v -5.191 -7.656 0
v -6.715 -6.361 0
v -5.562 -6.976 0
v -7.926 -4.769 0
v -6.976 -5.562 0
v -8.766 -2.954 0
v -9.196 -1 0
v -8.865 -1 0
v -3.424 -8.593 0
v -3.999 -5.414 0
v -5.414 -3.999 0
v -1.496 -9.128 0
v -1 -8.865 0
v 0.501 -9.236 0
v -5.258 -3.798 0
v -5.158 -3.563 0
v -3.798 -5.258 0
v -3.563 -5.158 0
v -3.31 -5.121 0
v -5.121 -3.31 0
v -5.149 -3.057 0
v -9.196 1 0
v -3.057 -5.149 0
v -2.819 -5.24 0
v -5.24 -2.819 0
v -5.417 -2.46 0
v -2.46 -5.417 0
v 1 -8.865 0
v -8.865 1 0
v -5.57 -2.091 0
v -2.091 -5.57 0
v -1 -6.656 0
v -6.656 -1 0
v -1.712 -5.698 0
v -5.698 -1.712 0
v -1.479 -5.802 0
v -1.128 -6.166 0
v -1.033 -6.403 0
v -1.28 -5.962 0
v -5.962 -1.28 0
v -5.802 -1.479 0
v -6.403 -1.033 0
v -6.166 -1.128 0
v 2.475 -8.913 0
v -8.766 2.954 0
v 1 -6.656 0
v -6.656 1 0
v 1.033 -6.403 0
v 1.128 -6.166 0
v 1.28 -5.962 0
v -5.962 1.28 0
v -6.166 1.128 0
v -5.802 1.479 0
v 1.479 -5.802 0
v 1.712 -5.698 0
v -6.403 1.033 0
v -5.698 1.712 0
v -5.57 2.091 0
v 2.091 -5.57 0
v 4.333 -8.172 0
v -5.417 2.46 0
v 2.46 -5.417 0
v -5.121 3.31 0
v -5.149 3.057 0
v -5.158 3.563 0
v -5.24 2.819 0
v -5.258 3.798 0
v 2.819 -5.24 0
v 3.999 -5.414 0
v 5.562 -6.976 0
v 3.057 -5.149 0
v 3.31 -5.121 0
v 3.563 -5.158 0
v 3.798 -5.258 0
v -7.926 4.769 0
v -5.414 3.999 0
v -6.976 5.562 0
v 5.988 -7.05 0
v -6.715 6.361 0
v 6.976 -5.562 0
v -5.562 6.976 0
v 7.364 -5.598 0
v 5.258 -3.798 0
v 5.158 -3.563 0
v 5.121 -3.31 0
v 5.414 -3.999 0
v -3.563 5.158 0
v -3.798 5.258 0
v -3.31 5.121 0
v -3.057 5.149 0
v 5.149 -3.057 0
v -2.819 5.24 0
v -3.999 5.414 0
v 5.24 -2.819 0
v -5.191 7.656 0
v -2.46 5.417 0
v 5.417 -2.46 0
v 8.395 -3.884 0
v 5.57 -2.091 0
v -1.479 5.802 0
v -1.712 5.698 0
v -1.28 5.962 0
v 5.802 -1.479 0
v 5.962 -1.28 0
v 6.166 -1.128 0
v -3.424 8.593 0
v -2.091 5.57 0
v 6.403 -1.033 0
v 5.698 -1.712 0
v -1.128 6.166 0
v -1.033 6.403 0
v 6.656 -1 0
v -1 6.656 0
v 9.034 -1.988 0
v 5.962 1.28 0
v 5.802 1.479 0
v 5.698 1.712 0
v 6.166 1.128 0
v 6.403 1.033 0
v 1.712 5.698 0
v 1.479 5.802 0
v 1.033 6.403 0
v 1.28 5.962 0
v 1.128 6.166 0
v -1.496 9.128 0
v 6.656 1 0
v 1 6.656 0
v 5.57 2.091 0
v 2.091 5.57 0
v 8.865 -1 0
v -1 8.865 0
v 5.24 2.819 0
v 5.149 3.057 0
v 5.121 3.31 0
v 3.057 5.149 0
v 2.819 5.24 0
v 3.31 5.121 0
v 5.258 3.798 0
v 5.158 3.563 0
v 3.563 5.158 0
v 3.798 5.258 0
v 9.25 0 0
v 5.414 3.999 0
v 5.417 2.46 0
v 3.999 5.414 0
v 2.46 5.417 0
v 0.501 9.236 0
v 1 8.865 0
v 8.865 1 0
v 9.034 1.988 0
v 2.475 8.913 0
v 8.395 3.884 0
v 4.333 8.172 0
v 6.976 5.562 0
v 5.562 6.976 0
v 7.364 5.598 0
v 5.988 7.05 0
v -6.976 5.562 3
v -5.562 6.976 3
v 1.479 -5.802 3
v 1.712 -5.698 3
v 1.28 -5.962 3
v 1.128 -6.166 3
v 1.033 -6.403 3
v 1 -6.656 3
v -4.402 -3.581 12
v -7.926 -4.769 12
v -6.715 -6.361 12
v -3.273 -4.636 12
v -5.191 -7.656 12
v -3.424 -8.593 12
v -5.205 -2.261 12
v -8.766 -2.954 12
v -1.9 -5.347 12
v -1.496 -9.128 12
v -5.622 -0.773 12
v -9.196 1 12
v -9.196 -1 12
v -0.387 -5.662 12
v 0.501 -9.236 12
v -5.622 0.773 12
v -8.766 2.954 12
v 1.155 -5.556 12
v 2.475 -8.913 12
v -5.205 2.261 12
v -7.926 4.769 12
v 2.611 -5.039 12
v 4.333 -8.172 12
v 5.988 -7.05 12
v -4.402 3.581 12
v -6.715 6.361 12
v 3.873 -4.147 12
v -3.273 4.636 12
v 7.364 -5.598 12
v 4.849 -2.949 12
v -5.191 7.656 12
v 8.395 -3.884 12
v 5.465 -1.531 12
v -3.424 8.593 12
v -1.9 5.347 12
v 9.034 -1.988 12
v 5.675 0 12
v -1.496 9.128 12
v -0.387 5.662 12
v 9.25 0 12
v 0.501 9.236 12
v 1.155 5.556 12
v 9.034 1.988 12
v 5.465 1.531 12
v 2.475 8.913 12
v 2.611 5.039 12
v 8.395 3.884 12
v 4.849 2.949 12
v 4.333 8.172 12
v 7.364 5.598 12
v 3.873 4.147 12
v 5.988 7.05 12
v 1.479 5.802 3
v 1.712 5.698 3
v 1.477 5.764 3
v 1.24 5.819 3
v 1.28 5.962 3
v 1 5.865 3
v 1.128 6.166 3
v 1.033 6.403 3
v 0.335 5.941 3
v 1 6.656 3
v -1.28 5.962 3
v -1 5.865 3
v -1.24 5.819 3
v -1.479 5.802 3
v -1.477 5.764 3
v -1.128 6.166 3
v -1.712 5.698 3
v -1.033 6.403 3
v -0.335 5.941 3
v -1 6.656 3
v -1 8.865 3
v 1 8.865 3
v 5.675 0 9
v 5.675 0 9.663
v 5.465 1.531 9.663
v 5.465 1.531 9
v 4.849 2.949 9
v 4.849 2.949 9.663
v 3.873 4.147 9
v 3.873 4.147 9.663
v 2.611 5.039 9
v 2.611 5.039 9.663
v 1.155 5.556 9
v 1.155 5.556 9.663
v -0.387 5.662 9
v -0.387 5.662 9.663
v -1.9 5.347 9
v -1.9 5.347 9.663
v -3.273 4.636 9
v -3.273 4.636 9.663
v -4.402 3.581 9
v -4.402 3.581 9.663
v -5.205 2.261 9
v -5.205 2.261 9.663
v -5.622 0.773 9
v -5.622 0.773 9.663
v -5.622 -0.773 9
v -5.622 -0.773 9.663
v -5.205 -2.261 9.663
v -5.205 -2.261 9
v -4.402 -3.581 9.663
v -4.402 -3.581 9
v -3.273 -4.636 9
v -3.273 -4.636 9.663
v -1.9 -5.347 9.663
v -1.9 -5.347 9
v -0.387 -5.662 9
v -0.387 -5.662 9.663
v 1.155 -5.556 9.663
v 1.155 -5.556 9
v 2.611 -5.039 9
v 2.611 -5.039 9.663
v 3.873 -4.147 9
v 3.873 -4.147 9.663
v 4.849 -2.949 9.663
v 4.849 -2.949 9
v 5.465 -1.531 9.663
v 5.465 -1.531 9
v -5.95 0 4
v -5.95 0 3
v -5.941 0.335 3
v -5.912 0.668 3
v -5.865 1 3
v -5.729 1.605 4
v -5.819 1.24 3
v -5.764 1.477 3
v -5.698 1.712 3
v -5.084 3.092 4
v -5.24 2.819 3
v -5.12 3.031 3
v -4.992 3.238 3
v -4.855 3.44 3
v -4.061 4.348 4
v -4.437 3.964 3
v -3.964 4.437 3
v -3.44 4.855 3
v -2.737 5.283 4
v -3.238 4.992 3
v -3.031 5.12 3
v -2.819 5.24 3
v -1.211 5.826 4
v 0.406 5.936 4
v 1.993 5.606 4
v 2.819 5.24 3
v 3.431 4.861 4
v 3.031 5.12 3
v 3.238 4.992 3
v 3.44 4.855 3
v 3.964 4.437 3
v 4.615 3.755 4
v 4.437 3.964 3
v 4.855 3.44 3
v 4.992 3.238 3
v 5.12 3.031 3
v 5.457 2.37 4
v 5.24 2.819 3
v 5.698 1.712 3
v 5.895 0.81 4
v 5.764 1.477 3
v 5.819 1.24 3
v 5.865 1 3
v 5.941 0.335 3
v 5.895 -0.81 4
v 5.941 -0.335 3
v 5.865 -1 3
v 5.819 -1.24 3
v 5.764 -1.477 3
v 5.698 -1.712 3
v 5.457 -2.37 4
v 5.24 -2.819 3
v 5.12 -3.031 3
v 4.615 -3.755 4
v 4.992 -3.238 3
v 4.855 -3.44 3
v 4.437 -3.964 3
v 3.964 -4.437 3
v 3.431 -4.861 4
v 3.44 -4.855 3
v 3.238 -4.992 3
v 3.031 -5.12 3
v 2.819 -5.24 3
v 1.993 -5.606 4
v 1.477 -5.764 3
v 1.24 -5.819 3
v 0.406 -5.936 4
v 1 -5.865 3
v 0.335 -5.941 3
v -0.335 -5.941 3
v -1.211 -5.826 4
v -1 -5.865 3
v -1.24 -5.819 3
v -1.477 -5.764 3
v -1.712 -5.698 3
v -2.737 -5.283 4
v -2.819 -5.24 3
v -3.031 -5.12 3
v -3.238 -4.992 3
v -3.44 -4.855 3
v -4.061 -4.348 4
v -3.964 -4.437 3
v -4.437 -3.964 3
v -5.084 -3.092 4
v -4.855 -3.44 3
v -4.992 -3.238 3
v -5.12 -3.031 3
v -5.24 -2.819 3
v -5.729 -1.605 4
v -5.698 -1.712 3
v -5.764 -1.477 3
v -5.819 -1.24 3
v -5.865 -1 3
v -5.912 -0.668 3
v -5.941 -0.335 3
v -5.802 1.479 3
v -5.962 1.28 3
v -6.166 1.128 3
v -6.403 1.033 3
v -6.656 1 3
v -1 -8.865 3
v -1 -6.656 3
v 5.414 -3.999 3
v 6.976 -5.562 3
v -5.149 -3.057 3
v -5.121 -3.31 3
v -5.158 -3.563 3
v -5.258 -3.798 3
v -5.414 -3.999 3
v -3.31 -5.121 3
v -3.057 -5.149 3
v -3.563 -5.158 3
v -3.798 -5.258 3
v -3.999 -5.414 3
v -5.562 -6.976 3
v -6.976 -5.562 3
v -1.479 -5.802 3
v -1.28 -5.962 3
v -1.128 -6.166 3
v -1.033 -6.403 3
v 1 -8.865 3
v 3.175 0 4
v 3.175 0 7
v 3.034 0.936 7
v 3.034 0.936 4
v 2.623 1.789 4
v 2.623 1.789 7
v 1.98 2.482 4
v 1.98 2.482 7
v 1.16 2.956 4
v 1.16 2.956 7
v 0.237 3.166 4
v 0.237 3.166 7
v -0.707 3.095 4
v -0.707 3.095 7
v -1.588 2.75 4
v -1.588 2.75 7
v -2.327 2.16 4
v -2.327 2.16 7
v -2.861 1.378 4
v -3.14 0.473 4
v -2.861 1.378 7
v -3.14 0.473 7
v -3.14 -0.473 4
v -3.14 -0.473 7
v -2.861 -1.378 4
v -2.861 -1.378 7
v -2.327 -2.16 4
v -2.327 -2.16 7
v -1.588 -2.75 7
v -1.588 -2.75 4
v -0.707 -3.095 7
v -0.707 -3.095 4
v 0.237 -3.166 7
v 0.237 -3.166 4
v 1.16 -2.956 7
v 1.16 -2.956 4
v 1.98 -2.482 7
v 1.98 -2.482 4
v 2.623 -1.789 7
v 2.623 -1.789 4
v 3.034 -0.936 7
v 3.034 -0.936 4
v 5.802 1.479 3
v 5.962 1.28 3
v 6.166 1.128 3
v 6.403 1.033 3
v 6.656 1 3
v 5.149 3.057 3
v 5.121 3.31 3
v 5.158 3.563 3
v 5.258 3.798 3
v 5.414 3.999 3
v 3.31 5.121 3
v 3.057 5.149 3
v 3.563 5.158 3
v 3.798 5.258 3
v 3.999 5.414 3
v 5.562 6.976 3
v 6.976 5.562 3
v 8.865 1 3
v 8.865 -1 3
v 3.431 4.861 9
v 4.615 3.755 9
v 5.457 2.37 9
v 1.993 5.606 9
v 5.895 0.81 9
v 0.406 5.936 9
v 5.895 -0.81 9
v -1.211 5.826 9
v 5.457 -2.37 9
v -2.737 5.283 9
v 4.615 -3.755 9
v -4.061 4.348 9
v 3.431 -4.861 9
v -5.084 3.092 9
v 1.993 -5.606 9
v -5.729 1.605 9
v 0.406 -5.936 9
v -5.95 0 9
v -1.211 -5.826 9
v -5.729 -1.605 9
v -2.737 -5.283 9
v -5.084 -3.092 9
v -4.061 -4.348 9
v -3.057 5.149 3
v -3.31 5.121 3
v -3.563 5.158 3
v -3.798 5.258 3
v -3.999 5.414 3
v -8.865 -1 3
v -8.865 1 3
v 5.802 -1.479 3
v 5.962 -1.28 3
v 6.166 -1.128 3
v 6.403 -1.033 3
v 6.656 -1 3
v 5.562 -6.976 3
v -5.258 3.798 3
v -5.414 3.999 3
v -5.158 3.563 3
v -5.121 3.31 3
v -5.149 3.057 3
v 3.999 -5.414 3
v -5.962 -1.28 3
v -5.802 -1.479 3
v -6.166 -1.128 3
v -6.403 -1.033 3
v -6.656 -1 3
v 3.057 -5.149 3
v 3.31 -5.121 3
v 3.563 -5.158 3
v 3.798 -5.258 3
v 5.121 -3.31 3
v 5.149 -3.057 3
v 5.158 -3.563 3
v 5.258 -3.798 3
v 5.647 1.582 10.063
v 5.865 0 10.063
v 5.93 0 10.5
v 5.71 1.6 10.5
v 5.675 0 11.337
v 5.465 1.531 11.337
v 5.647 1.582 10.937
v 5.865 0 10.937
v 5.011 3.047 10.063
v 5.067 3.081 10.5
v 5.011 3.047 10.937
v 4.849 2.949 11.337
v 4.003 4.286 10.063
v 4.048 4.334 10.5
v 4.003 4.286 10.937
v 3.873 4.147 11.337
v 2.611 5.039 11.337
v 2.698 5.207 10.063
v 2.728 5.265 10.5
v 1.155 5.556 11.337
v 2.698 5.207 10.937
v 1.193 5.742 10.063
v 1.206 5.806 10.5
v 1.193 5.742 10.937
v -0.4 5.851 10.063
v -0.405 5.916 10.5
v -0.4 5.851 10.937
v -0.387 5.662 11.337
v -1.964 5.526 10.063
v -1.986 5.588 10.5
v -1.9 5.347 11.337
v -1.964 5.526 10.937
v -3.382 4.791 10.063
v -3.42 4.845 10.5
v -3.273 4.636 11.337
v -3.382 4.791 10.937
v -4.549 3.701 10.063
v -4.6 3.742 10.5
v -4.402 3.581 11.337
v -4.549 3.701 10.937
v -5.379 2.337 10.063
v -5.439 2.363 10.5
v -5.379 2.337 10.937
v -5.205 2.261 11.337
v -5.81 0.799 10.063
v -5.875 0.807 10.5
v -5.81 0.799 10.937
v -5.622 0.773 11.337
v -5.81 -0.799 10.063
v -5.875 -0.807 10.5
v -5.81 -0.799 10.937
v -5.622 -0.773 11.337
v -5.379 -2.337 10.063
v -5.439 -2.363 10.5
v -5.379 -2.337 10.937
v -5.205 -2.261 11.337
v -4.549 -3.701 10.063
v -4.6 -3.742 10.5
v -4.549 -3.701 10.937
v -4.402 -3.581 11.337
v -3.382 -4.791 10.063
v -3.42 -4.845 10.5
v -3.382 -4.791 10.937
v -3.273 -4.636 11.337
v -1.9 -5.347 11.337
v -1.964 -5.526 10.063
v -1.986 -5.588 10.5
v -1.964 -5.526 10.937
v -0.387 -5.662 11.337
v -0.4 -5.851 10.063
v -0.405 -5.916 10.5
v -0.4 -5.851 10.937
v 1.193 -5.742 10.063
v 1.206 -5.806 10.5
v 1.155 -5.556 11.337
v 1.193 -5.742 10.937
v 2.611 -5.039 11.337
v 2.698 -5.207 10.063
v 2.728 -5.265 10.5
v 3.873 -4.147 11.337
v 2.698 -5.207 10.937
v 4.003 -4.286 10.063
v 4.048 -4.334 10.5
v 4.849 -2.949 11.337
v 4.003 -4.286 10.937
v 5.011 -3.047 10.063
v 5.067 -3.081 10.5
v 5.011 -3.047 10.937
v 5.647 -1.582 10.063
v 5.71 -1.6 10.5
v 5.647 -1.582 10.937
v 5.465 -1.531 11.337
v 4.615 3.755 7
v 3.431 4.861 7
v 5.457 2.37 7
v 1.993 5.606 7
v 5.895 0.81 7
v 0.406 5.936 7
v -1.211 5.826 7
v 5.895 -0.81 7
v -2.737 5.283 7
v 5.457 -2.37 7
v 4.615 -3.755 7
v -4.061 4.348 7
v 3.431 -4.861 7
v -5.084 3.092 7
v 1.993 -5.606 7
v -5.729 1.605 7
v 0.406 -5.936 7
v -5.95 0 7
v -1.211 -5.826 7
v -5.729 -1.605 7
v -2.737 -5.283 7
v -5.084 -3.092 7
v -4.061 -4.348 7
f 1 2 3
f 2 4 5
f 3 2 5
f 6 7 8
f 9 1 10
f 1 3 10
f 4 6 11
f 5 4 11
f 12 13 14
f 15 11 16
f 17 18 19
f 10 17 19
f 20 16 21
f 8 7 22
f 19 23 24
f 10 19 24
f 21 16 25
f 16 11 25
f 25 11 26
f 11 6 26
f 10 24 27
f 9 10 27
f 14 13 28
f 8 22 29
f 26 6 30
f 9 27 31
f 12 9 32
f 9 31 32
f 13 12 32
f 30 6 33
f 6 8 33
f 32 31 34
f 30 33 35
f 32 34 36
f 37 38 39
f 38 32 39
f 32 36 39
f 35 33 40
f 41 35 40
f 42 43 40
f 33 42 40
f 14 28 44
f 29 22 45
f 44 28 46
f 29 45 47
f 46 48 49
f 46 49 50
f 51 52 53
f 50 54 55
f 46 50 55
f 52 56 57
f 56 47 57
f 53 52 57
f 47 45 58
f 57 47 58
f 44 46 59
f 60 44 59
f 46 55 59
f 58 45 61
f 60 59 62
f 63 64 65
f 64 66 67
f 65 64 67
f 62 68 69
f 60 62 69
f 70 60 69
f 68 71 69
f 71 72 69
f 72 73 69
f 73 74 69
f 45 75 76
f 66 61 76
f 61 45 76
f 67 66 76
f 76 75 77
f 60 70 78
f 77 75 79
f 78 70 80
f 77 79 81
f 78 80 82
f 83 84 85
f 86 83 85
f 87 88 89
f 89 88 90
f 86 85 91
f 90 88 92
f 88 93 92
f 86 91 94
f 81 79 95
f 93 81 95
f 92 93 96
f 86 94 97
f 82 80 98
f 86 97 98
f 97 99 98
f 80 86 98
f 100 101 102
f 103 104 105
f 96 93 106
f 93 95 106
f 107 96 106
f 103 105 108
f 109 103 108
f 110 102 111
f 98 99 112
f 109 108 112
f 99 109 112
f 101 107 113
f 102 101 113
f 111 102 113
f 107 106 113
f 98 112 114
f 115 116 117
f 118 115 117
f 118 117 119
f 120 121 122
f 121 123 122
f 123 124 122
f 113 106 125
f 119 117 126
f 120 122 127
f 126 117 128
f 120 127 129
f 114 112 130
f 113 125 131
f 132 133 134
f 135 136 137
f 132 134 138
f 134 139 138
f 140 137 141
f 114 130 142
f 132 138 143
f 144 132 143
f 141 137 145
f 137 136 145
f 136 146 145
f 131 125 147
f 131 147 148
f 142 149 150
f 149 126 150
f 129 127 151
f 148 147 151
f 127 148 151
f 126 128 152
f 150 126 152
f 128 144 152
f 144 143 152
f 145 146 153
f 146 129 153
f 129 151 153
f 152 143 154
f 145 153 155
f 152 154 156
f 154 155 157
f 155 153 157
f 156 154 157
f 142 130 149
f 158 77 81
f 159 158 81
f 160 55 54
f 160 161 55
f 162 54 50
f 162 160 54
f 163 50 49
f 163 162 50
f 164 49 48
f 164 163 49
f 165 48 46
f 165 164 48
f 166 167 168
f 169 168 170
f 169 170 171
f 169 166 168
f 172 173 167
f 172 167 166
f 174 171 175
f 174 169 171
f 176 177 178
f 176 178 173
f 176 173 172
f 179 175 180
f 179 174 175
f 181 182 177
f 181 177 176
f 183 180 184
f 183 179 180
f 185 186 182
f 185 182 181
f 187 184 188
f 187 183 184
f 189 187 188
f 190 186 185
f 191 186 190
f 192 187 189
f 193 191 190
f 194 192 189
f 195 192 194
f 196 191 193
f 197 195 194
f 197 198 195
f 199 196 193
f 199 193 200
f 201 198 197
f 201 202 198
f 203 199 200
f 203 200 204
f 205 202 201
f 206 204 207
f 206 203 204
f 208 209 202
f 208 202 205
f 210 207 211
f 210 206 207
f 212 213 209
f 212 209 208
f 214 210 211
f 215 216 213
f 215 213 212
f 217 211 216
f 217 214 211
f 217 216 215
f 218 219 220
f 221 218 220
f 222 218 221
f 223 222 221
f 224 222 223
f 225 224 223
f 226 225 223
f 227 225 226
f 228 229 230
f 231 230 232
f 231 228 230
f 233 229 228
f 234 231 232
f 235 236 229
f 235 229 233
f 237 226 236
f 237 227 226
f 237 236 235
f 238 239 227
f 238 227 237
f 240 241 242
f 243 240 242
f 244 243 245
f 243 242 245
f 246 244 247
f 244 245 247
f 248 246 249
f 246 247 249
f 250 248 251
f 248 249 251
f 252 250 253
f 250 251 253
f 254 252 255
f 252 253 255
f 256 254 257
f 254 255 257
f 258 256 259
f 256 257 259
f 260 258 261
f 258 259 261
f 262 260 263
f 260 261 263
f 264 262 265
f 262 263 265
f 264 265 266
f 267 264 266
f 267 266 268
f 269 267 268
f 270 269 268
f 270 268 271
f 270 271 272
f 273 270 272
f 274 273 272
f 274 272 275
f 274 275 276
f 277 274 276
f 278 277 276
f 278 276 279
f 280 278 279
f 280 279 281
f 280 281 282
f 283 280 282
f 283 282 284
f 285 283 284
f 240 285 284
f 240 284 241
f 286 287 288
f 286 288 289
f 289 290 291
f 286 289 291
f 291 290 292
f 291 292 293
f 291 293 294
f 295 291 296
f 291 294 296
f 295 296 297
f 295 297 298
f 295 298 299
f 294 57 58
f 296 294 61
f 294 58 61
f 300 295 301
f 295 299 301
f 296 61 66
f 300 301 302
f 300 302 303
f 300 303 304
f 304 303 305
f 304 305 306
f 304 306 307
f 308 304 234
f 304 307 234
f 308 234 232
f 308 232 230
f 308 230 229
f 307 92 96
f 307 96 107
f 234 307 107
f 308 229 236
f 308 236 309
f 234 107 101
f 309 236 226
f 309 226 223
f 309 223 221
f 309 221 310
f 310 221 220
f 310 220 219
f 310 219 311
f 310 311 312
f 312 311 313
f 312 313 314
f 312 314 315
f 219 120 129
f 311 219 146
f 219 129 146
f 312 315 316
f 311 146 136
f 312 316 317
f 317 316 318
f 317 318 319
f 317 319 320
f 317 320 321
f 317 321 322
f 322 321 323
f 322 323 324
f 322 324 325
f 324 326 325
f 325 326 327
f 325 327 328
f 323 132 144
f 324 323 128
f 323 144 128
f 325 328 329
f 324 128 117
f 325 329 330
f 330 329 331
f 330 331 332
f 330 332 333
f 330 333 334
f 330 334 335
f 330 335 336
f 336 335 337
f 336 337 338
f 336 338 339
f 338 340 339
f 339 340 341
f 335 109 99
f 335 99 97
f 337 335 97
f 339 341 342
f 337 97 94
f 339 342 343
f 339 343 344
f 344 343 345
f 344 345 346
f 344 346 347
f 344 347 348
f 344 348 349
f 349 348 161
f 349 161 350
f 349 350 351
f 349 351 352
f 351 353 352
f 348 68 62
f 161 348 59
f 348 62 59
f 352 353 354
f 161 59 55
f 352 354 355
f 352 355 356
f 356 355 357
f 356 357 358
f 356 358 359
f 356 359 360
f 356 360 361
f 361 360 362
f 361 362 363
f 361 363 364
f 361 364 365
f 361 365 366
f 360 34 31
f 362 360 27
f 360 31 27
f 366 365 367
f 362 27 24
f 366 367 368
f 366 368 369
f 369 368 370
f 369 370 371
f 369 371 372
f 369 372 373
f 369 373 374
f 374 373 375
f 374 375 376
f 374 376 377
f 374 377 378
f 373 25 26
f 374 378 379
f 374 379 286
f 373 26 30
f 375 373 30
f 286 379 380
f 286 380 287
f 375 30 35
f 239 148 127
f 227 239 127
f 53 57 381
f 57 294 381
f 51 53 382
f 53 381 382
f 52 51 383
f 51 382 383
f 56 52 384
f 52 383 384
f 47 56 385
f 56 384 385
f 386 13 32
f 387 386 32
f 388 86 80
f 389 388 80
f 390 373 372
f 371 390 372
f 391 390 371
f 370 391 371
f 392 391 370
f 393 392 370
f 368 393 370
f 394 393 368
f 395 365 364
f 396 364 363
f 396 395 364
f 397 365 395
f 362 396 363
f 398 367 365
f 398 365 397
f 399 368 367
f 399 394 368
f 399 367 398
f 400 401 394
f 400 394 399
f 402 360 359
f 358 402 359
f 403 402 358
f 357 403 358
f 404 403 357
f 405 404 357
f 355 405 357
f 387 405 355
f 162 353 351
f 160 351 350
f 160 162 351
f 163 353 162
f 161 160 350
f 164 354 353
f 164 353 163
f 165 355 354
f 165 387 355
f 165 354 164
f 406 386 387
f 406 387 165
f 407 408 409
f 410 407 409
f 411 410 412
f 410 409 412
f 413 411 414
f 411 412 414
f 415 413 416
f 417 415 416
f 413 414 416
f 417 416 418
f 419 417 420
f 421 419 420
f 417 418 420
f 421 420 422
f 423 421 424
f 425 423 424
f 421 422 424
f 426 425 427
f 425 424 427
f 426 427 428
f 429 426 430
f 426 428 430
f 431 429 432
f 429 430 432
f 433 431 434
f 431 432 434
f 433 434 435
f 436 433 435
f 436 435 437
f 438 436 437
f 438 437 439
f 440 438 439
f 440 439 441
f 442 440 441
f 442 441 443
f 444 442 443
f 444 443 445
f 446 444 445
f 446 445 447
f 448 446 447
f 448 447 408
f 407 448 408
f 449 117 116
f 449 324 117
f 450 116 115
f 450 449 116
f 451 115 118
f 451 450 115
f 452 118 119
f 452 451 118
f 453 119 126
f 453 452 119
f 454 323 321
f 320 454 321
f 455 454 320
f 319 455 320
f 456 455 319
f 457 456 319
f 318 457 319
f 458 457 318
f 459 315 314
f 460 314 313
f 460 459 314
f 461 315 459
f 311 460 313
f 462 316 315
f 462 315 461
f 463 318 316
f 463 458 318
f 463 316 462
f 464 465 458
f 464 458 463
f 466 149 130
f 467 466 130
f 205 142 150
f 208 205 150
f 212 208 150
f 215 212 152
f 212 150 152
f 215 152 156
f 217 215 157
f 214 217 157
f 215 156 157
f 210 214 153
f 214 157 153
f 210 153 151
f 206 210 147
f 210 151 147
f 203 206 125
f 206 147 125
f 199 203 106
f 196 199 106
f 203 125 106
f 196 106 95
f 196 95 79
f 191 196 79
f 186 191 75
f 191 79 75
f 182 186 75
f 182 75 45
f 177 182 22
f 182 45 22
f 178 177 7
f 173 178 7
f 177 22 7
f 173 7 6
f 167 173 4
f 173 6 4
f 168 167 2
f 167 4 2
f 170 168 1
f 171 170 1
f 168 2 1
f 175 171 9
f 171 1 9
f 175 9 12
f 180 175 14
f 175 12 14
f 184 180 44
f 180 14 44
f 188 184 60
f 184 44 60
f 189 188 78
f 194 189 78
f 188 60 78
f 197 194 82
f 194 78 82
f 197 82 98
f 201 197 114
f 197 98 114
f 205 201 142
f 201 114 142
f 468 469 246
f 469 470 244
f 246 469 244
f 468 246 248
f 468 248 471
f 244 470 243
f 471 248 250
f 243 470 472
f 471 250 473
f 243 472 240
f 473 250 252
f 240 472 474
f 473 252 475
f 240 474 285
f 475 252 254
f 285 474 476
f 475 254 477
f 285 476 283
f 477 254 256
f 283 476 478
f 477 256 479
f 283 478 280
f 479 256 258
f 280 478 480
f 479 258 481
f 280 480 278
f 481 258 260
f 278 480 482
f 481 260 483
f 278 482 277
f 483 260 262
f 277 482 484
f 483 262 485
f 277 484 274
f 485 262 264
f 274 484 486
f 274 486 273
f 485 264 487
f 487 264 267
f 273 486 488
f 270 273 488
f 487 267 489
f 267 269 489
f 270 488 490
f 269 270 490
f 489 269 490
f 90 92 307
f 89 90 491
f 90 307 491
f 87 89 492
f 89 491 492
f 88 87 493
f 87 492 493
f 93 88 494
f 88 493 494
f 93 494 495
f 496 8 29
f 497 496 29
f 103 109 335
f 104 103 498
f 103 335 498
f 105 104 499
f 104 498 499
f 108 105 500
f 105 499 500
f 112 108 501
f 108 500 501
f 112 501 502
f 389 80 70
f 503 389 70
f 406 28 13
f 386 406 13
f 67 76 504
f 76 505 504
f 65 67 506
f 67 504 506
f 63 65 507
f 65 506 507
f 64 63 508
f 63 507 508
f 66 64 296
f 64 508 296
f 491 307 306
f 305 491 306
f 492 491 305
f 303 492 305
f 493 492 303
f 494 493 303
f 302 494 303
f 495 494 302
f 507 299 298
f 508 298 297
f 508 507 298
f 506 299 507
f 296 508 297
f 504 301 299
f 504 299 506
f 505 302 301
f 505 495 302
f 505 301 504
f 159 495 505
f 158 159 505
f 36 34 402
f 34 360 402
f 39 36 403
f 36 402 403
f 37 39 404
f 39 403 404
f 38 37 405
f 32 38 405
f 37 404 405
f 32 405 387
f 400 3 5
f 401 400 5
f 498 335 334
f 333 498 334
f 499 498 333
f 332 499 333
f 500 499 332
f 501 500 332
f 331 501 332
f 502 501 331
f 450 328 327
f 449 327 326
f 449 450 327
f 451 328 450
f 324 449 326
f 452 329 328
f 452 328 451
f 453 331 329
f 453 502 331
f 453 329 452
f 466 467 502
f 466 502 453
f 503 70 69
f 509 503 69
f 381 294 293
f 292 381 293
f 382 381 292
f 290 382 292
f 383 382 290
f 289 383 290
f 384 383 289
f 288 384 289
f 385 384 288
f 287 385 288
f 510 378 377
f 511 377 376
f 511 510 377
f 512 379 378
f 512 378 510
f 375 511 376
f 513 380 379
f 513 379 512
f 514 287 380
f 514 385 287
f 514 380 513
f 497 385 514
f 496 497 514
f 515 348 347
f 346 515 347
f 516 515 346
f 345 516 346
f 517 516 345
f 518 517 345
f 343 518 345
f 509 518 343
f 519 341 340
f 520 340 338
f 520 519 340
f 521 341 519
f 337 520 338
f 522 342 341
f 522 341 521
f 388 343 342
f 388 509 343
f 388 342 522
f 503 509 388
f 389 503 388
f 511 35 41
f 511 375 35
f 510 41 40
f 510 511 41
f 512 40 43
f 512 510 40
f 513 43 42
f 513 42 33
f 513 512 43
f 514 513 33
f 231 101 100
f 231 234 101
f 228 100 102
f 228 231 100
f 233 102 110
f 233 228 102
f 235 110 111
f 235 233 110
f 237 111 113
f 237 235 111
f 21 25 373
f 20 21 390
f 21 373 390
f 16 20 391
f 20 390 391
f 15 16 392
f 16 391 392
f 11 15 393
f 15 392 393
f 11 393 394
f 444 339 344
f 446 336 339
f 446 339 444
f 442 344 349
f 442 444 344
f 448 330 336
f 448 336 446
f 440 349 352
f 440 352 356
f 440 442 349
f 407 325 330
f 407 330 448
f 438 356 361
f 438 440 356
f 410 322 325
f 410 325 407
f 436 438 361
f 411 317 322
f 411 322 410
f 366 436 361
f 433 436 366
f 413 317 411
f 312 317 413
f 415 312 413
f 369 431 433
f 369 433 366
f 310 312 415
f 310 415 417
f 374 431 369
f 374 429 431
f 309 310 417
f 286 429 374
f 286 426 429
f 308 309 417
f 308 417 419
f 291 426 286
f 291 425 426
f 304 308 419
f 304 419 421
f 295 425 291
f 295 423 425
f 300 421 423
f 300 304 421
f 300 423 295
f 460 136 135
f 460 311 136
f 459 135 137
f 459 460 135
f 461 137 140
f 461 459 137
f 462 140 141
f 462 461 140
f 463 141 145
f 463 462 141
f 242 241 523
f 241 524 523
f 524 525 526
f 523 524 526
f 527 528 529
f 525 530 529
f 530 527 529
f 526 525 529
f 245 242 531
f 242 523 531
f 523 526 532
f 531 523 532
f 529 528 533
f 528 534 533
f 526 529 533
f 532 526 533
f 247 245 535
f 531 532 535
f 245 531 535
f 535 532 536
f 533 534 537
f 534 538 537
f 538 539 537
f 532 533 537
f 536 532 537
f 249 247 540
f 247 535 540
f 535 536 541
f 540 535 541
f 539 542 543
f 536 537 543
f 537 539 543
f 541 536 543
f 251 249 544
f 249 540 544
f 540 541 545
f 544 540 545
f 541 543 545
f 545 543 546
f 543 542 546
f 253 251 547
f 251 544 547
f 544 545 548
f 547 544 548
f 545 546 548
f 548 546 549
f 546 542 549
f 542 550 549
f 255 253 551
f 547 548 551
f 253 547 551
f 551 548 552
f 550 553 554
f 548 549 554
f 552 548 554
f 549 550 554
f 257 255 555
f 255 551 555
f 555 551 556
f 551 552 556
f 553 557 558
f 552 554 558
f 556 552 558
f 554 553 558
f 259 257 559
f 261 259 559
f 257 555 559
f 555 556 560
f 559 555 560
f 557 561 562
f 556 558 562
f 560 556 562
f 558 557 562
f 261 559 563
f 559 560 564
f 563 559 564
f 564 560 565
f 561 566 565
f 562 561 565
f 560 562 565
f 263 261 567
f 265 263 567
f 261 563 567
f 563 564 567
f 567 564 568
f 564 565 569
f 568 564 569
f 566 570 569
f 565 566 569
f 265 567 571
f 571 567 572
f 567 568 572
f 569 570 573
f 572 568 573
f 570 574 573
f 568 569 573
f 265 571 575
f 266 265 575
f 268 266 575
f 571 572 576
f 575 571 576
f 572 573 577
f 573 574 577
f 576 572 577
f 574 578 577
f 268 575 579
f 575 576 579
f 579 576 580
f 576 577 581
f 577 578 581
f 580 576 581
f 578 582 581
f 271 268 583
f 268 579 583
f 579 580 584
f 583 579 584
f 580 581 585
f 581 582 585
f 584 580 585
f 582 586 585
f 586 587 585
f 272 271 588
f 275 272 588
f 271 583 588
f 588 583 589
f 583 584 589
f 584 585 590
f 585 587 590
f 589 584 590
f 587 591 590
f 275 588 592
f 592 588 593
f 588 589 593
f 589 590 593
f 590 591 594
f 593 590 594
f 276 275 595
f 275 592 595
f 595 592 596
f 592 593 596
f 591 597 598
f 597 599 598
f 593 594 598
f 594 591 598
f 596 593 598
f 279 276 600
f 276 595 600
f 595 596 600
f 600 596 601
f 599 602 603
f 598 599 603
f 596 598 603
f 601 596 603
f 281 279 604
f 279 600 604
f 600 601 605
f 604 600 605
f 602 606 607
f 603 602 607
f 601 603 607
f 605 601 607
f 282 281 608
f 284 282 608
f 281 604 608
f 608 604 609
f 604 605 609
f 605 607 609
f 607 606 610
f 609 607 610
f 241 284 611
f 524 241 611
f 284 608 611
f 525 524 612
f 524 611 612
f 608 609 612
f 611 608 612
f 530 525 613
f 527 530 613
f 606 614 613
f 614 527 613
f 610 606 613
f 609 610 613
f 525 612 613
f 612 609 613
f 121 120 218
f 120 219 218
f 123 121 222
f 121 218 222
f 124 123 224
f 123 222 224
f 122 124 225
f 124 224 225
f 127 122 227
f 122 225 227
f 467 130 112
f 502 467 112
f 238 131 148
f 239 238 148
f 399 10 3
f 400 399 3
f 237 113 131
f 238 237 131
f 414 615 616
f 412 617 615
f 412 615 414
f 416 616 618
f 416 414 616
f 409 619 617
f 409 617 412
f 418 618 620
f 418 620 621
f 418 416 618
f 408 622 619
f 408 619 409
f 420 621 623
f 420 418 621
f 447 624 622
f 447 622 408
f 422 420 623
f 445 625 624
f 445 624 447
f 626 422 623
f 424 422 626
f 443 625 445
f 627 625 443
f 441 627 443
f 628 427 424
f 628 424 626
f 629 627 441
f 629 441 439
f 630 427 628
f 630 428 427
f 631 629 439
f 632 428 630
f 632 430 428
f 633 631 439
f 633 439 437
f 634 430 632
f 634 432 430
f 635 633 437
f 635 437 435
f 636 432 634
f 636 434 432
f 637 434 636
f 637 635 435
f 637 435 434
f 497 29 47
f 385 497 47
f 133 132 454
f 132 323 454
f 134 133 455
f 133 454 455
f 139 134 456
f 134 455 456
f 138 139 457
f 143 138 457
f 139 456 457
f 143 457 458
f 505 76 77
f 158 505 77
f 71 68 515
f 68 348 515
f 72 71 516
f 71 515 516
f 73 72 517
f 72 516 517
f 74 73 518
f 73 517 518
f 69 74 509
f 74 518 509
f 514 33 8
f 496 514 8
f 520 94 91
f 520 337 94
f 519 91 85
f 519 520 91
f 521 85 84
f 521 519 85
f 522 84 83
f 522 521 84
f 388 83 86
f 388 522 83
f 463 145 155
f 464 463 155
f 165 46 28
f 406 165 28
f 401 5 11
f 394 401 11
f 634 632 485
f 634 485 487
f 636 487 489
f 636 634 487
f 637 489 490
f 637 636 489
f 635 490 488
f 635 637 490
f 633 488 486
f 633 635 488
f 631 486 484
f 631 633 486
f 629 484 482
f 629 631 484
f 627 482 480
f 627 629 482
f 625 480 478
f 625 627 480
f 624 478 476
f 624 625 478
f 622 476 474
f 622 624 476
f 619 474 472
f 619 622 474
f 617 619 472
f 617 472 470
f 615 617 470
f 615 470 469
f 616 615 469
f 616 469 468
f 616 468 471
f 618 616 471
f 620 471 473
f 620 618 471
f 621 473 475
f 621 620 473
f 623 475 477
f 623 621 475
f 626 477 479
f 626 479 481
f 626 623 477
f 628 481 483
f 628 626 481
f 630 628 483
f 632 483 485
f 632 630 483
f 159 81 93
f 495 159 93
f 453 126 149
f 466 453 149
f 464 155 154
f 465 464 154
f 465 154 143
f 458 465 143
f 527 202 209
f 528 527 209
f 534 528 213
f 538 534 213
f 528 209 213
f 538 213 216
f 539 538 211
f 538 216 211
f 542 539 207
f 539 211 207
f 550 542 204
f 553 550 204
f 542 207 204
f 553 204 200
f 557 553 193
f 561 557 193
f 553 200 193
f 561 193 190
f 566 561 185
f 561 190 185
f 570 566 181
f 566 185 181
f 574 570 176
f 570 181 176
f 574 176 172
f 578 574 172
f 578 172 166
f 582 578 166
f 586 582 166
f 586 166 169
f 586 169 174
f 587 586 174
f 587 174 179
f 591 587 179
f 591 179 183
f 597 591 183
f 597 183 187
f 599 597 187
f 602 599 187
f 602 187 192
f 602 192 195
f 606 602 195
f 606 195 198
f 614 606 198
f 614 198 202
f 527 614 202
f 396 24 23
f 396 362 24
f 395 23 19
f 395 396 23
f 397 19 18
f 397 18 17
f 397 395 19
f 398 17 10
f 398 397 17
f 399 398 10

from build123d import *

# Parameters (mm, degrees)
SKETCH1_R           = 9.25
BOSS_EXTRUDE1_DEPTH = 12
SKETCH2_R           = 5.95
CUT_EXTRUDE1_DEPTH  = 4
CUT_EXTRUDE2_DEPTH  = 3
CIRPATTERN1_COUNT   = 8
SKETCH5_R           = 3.175
CUT_EXTRUDE3_DEPTH  = 8
CUT_EXTRUDE4_START  = -5
SKETCH6_R           = 5.95
CUT_EXTRUDE4_DEPTH  = 2
CUT_EXTRUDE5_REACH  = 19.752
SKETCH7_R           = 5.675
SKETCH8_R           = 1.5
FILLET1_R           = 1


with BuildPart() as part:
    # Sketch1 → Boss-Extrude1 (new body)
    with BuildSketch(Plane.XY):
        Circle(SKETCH1_R)
    extrude(amount=BOSS_EXTRUDE1_DEPTH)

    # Sketch2 → Cut-Extrude1 (cut)
    with BuildSketch(Plane(origin=(0, 0, 0), x_dir=(-1, 0, 0), z_dir=(0, 0, -1))):
        Circle(SKETCH2_R)
    extrude(amount=-CUT_EXTRUDE1_DEPTH, mode=Mode.SUBTRACT)

    # Sketch4 → Cut-Extrude2 (cut)
    with BuildSketch(Plane(origin=(0, 0, 0), x_dir=(-1, 0, 0), z_dir=(0, 0, -1))):
        with BuildLine():
            Line((1, 5.865364439), (1, 8.865364439))
            Line((1, 8.865364439), (-1, 8.865364439))
            Line((-1, 8.865364439), (-1, 5.865364439))
            ThreePointArc((-1, 5.865364439), (0, 5.95), (1, 5.865364439))
        make_face()
    cut_extrude2 = extrude(amount=-CUT_EXTRUDE2_DEPTH, mode=Mode.SUBTRACT)

    # CirPattern1: Cut-Extrude2 ×8 about axis
    cirpattern1_axis = Axis((0, 0, 0), (0, 0, 1))
    for i in range(1, CIRPATTERN1_COUNT):
        add(cut_extrude2.rotate(cirpattern1_axis, i * 360 / CIRPATTERN1_COUNT), mode=Mode.SUBTRACT)

    # Sketch5 → Cut-Extrude3 (cut)
    with BuildSketch(Plane.XY.offset(12)):
        Circle(SKETCH5_R)
    extrude(amount=-CUT_EXTRUDE3_DEPTH, mode=Mode.SUBTRACT)

    # Sketch6 → Cut-Extrude4 (cut)
    with BuildSketch(Plane.XY.offset(12).offset(CUT_EXTRUDE4_START)):
        with Locations(Location((0, 0, 0), (0, 0, 180))):
            Circle(SKETCH6_R)
    extrude(amount=CUT_EXTRUDE4_DEPTH, mode=Mode.SUBTRACT)

    # Sketch7 → Cut-Extrude5 (cut, up to next)
    with BuildSketch(Plane.XY.offset(12), mode=Mode.PRIVATE) as cut_extrude5_sk1:
        Circle(SKETCH7_R)
    cut_extrude5_tool1 = extrude(cut_extrude5_sk1.sketch, amount=-CUT_EXTRUDE5_REACH, mode=Mode.PRIVATE) & part.part
    add(cut_extrude5_tool1.solids().sort_by_distance((0, 0, 12))[0], mode=Mode.SUBTRACT)

    # Sketch8 → Cut-Revolve1 (revolve, cut)
    with BuildSketch(Plane(origin=(0, 0, 0), x_dir=(1, 0, 0), z_dir=(0, 1, 0)), mode=Mode.PRIVATE) as cut_revolve1_sk:
        with Locations((-4.43, -10.5)):
            Circle(SKETCH8_R)
    revolve(cut_revolve1_sk.sketch.rotate(Axis((0, 0, 0), (0, 0, 1)), 180), axis=Axis((0, 0, 0), (0, 0, 1)), mode=Mode.SUBTRACT)

    # Fillet1
    fillet1_edges = [part.edges().sort_by_distance(p)[0] for p in [
        (-1, 5.865364439, 1.5),
        (1, 5.865364439, 1.5),
        (-5.865364439, -1, 1.5),
        (-5.865364439, 1, 1.5),
        (-3.440332188, -4.85454575, 1.5),
        (-4.85454575, -3.440332188, 1.5),
        (1, -5.865364439, 1.5),
        (-1, -5.865364439, 1.5),
        (4.85454575, -3.440332188, 1.5),
        (3.440332188, -4.85454575, 1.5),
        (5.865364439, 1, 1.5),
        (5.865364439, -1, 1.5),
        (3.440332188, 4.85454575, 1.5),
        (4.85454575, 3.440332188, 1.5),
        (-4.85454575, 3.440332188, 1.5),
        (-3.440332188, 4.85454575, 1.5),
    ]]
    fillet(fillet1_edges, radius=FILLET1_R)


solid = part.part
